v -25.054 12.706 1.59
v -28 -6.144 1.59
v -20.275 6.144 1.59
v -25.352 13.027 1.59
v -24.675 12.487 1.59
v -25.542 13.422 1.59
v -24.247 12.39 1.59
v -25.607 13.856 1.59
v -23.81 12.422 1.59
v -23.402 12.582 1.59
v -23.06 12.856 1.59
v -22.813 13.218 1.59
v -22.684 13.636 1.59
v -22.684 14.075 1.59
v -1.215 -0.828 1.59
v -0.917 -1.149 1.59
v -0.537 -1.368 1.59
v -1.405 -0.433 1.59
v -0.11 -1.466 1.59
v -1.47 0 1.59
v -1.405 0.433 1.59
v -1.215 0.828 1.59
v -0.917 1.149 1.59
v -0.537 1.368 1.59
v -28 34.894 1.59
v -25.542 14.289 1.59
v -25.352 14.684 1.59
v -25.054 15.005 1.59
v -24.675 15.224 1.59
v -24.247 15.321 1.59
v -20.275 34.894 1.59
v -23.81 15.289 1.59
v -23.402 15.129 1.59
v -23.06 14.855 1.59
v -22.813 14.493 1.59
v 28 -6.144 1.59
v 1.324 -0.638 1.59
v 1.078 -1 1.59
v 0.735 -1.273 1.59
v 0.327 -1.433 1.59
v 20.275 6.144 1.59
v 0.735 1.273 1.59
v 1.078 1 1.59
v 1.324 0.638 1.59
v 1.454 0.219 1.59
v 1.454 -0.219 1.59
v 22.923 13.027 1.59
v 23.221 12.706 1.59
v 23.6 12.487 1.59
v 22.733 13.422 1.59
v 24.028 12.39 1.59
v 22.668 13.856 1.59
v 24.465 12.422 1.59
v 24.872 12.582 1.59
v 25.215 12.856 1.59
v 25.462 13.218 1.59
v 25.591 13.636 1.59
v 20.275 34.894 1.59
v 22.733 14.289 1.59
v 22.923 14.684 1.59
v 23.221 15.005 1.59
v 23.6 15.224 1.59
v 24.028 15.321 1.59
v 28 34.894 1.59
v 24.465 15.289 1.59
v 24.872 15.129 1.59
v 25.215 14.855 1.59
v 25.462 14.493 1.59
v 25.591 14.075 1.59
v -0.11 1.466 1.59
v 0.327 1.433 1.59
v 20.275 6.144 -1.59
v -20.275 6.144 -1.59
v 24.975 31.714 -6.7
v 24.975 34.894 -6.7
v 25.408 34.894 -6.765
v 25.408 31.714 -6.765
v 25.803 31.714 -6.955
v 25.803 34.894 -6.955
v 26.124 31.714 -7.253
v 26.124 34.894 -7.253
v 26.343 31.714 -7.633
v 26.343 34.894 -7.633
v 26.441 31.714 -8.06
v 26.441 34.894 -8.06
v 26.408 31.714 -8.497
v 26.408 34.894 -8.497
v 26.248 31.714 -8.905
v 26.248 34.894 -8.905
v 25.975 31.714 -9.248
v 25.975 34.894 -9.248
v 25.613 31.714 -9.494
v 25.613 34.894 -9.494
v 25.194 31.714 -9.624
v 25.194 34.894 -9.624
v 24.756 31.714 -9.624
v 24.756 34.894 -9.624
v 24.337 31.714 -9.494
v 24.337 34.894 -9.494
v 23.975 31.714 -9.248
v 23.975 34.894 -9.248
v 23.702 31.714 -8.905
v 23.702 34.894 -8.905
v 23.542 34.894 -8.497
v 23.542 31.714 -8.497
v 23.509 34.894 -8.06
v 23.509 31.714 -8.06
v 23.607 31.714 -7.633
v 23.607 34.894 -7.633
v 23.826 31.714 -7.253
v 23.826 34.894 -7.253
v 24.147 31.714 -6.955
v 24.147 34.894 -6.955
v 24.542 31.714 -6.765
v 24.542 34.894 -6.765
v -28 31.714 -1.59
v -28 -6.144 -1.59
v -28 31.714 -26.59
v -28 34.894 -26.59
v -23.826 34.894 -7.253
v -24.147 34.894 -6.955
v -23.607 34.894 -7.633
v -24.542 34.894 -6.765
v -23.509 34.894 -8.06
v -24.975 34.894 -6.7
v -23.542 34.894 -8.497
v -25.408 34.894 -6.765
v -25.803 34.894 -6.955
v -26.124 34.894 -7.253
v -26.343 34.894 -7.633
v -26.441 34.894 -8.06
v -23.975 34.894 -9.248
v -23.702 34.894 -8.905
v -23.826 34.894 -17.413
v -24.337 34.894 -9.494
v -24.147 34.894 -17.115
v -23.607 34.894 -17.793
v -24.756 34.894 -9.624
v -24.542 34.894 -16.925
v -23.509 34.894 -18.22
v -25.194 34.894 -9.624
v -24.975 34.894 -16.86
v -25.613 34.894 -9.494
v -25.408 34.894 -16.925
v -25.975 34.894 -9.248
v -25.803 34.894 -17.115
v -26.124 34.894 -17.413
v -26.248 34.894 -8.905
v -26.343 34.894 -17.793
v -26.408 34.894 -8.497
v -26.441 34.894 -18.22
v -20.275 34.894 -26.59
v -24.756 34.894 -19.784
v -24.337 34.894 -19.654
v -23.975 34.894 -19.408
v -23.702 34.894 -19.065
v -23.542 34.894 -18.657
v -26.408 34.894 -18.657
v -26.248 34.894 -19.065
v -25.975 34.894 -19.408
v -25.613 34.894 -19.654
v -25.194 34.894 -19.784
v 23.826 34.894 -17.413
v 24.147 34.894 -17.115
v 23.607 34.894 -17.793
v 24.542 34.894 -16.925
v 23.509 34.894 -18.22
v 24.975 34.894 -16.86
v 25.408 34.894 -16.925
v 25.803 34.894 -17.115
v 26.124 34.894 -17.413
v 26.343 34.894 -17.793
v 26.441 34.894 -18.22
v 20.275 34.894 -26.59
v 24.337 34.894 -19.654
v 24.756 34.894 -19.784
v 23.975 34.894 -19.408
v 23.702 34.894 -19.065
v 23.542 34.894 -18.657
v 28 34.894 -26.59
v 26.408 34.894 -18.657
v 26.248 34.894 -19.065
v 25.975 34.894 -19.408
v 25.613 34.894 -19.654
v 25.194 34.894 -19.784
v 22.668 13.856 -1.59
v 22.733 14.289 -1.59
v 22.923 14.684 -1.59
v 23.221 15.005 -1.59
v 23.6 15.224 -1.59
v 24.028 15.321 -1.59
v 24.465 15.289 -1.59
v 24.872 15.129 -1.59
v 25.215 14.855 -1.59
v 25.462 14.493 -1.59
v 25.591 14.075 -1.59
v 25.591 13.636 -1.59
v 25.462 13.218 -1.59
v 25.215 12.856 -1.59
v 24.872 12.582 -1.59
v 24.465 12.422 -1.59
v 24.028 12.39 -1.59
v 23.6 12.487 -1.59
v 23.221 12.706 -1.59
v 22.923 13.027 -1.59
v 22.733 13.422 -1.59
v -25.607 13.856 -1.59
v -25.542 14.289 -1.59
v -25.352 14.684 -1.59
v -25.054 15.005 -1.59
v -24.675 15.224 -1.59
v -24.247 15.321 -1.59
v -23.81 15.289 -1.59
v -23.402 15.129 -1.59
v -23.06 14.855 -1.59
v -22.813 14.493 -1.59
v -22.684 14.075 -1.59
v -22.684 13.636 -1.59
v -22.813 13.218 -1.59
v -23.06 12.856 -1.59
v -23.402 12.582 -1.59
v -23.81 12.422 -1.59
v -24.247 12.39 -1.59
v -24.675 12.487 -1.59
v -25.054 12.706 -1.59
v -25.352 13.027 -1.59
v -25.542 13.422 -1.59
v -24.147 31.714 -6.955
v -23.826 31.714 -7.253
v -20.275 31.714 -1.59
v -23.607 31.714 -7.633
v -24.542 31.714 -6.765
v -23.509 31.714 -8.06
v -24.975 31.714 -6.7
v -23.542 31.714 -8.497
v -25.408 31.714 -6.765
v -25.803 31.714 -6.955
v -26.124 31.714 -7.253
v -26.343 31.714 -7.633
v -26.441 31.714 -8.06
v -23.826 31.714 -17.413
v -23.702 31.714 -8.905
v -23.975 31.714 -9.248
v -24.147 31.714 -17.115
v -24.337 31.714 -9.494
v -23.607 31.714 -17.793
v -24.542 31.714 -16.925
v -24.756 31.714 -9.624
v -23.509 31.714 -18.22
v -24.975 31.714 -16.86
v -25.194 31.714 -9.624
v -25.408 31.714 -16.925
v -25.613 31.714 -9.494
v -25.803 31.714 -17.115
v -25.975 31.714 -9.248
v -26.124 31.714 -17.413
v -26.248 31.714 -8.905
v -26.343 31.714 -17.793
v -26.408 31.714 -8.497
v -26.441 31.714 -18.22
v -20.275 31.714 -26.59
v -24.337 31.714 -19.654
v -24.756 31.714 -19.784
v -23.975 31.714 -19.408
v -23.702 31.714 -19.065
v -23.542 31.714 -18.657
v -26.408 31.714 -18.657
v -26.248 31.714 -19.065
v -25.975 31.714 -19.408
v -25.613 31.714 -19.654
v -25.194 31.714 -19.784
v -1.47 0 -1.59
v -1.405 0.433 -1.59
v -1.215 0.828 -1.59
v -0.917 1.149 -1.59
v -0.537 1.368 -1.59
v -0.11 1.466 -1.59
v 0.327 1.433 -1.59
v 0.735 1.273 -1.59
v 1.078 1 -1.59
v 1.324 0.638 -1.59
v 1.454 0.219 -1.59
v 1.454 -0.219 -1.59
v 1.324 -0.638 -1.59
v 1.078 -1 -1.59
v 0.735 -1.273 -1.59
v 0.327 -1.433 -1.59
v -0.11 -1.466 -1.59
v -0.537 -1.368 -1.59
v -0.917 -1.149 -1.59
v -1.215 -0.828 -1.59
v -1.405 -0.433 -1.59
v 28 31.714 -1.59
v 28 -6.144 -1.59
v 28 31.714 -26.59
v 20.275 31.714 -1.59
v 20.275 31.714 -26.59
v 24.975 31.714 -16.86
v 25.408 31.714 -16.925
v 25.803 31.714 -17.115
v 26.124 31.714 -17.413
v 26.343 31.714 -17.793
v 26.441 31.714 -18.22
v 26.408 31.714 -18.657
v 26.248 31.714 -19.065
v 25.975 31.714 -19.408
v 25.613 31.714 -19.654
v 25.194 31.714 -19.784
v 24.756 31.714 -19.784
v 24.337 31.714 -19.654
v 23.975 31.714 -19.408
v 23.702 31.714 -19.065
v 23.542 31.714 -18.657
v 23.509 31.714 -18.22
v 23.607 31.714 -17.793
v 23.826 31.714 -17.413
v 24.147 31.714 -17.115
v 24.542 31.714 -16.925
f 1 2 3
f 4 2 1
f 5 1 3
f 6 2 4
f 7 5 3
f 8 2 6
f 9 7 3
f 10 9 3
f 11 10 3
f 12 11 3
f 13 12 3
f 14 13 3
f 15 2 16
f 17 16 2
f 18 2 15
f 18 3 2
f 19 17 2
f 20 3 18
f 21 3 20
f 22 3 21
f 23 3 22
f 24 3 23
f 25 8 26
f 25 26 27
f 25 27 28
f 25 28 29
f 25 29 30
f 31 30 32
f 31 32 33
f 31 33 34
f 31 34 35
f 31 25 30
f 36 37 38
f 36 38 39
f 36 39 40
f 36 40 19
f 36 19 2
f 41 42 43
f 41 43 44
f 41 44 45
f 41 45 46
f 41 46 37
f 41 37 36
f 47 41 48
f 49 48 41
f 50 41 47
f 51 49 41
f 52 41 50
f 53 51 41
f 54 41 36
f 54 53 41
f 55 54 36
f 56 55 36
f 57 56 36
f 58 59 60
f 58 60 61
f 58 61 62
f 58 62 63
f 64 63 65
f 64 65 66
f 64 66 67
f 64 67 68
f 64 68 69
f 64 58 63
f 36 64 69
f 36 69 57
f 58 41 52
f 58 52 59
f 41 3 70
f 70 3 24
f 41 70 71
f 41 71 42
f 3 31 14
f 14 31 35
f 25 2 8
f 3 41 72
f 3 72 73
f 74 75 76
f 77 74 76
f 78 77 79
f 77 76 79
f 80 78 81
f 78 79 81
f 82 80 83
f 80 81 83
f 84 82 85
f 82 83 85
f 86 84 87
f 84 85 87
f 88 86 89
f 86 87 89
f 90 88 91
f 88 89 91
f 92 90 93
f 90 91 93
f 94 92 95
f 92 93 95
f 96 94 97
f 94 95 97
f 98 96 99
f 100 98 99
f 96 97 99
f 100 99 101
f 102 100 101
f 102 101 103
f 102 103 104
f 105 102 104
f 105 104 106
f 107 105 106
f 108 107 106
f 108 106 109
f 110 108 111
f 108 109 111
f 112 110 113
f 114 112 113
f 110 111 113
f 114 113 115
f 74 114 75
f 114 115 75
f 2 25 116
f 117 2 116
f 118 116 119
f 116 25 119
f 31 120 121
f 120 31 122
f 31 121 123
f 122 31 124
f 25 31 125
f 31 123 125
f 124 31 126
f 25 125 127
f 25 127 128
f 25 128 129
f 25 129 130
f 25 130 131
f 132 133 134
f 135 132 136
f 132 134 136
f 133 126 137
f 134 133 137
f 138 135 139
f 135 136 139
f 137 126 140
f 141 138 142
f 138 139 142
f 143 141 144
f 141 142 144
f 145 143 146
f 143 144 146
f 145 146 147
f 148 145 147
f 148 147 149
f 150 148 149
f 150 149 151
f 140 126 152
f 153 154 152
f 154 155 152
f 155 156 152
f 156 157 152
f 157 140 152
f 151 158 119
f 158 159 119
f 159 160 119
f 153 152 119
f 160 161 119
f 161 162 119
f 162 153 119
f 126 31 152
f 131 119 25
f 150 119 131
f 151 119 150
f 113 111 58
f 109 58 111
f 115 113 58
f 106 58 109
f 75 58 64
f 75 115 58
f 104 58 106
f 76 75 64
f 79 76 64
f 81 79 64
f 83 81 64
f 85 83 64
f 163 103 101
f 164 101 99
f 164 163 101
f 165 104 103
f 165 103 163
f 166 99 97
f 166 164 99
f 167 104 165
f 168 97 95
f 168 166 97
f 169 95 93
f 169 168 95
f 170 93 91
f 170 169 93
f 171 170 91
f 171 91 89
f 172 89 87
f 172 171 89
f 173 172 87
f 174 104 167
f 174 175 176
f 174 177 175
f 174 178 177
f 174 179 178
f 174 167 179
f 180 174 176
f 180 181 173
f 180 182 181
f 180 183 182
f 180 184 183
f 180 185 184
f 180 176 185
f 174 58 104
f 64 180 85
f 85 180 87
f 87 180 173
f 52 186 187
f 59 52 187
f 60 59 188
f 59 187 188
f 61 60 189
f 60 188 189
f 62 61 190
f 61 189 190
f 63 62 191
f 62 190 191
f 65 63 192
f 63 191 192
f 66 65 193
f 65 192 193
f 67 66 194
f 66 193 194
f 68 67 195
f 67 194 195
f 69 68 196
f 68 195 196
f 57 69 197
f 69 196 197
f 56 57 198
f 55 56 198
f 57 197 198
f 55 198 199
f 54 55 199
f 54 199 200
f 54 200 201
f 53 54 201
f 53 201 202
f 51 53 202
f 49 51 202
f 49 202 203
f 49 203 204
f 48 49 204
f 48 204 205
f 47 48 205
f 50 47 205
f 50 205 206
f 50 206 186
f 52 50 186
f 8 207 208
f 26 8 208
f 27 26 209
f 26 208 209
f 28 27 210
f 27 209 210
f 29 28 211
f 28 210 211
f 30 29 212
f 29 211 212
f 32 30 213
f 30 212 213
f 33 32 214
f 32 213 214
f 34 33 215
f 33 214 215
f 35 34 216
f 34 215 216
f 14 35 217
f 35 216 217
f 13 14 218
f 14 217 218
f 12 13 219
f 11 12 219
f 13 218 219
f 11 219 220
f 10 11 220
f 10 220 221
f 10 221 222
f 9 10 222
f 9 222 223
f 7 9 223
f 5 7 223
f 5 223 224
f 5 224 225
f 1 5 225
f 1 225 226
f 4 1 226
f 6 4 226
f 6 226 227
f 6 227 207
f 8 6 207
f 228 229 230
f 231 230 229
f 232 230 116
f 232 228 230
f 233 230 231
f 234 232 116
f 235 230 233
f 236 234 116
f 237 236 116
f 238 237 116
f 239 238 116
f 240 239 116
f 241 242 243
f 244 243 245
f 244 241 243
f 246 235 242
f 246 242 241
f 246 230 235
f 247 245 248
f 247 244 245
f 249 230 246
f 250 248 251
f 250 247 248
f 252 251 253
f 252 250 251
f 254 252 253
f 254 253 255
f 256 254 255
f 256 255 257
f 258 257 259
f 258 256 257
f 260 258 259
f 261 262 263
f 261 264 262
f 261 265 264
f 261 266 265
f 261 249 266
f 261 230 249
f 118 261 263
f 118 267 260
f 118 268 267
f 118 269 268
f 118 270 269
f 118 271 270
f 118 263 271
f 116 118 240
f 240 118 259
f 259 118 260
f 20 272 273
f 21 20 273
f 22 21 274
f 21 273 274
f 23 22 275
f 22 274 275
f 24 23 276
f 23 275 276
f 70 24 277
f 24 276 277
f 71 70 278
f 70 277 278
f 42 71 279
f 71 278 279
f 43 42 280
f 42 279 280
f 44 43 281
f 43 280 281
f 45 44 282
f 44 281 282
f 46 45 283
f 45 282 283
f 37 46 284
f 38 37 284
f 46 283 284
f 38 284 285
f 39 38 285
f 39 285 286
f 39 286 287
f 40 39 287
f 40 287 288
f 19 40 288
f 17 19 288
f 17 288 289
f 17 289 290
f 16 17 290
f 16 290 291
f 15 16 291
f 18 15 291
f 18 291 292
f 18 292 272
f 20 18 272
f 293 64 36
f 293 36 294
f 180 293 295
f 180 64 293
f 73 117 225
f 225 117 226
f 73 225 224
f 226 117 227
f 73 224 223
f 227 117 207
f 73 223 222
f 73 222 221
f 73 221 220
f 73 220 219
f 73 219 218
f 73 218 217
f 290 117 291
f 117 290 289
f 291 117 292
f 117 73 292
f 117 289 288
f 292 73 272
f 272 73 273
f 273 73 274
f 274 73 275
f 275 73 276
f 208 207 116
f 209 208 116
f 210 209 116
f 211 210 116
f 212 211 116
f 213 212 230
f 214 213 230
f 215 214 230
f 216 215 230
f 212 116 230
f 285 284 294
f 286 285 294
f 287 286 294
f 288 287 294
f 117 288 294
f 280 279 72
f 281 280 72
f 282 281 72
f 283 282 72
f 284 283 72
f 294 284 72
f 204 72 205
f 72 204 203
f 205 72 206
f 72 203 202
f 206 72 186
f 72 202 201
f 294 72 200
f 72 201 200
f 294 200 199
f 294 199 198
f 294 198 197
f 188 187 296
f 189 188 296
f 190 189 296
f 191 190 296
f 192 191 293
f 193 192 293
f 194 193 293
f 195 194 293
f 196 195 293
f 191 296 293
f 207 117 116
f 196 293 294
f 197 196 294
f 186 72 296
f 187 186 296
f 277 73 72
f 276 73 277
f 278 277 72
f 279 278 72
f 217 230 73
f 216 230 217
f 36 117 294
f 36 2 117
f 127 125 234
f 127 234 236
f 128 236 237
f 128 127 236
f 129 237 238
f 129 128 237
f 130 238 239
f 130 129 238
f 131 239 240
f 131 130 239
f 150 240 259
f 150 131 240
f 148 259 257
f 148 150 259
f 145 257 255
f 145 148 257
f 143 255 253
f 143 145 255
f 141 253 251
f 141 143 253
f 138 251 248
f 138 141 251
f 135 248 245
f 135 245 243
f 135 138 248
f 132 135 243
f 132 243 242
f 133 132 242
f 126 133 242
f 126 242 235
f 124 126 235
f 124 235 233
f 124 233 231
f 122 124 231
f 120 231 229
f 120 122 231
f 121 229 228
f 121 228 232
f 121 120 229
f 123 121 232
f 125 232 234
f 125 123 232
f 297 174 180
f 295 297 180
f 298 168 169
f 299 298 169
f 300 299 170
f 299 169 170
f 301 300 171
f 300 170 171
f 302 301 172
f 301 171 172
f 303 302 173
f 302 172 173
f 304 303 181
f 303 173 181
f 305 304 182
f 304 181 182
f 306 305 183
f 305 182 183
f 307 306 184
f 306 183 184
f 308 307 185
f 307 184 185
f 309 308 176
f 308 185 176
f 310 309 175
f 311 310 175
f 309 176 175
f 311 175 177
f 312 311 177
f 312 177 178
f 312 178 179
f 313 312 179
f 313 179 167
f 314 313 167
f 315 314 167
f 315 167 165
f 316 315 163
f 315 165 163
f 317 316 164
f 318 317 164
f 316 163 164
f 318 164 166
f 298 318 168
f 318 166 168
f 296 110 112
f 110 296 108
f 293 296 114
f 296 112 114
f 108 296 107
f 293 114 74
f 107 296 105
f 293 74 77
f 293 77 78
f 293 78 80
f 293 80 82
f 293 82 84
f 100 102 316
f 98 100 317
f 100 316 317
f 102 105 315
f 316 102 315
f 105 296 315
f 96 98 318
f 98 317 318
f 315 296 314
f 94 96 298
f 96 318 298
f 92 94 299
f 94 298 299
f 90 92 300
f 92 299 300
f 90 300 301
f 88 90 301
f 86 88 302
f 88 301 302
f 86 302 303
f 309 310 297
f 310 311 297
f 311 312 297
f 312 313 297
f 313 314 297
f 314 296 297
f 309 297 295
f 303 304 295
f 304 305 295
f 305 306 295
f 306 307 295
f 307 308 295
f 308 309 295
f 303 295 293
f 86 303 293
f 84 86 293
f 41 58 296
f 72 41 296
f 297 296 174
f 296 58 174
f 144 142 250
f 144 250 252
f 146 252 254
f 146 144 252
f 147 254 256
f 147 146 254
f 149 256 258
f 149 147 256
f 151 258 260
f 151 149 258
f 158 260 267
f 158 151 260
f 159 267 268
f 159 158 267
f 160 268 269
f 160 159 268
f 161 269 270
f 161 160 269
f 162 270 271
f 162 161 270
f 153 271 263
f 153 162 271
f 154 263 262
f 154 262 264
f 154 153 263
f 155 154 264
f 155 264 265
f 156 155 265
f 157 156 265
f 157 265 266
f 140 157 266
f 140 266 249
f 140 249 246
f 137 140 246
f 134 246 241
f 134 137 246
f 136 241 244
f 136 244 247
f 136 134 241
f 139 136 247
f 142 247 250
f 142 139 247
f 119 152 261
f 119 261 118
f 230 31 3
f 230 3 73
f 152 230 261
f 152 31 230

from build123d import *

# Parameters (mm, degrees)
BOSS_EXTRUDE4_DEPTH = 1.59
SKETCH5_W           = 7.725
SKETCH5_H           = 25
SKETCH5_R           = 1.47
BOSS_EXTRUDE5_DEPTH = 3.18
SKETCH7_R           = 1.47
CUT_EXTRUDE1_DEPTH  = 52.250588065


with BuildPart() as part:
    # Sketch2 → Boss-Extrude4 (new, symmetric)
    with BuildSketch(Plane.XY):
        Polygon((-28, -6.144451952), (28, -6.144451952), (28, 12.576257704), (28, 34.894451952), (20.275, 34.894451952), (20.275, 6.144451952), (-20.275, 6.144451952), (-20.275, 34.894451952), (-28, 34.894451952), (-28, 2.372923503), align=None)
    extrude(amount=BOSS_EXTRUDE4_DEPTH, both=True)

    # Sketch5 → Boss-Extrude5 (add)
    with BuildSketch(Plane(origin=(0, 34.894451952, 0), x_dir=(1, 0, 0), z_dir=(0, 1, 0))):
        with Locations((24.1375, 14.09)):
            Rectangle(SKETCH5_W, SKETCH5_H)
        with Locations(Location((24.975, 8.17, 0), (0, 0, 270))):
            Circle(SKETCH5_R, mode=Mode.SUBTRACT)
        with Locations(Location((24.975, 18.33, 0), (0, 0, 270))):
            Circle(SKETCH5_R, mode=Mode.SUBTRACT)
    boss_extrude5 = extrude(amount=-BOSS_EXTRUDE5_DEPTH)

    # Mirror1: Boss-Extrude5 across plane
    add(boss_extrude5.mirror(Plane(origin=(0, 0, 0), x_dir=(0, 0, 1), z_dir=(1, 0, 0))))

    # Sketch7 → Cut-Extrude1 (cut, through all)
    with BuildSketch(Plane(origin=(0, 0, -1.59), x_dir=(-1, 0, 0), z_dir=(0, 0, -1))):
        Circle(SKETCH7_R)
        with Locations((24.1375, 13.855548048)):
            Circle(SKETCH7_R)
        with Locations((-24.1375, 13.855548048)):
            Circle(SKETCH7_R)
    extrude(amount=-CUT_EXTRUDE1_DEPTH, mode=Mode.SUBTRACT)


solid = part.part
